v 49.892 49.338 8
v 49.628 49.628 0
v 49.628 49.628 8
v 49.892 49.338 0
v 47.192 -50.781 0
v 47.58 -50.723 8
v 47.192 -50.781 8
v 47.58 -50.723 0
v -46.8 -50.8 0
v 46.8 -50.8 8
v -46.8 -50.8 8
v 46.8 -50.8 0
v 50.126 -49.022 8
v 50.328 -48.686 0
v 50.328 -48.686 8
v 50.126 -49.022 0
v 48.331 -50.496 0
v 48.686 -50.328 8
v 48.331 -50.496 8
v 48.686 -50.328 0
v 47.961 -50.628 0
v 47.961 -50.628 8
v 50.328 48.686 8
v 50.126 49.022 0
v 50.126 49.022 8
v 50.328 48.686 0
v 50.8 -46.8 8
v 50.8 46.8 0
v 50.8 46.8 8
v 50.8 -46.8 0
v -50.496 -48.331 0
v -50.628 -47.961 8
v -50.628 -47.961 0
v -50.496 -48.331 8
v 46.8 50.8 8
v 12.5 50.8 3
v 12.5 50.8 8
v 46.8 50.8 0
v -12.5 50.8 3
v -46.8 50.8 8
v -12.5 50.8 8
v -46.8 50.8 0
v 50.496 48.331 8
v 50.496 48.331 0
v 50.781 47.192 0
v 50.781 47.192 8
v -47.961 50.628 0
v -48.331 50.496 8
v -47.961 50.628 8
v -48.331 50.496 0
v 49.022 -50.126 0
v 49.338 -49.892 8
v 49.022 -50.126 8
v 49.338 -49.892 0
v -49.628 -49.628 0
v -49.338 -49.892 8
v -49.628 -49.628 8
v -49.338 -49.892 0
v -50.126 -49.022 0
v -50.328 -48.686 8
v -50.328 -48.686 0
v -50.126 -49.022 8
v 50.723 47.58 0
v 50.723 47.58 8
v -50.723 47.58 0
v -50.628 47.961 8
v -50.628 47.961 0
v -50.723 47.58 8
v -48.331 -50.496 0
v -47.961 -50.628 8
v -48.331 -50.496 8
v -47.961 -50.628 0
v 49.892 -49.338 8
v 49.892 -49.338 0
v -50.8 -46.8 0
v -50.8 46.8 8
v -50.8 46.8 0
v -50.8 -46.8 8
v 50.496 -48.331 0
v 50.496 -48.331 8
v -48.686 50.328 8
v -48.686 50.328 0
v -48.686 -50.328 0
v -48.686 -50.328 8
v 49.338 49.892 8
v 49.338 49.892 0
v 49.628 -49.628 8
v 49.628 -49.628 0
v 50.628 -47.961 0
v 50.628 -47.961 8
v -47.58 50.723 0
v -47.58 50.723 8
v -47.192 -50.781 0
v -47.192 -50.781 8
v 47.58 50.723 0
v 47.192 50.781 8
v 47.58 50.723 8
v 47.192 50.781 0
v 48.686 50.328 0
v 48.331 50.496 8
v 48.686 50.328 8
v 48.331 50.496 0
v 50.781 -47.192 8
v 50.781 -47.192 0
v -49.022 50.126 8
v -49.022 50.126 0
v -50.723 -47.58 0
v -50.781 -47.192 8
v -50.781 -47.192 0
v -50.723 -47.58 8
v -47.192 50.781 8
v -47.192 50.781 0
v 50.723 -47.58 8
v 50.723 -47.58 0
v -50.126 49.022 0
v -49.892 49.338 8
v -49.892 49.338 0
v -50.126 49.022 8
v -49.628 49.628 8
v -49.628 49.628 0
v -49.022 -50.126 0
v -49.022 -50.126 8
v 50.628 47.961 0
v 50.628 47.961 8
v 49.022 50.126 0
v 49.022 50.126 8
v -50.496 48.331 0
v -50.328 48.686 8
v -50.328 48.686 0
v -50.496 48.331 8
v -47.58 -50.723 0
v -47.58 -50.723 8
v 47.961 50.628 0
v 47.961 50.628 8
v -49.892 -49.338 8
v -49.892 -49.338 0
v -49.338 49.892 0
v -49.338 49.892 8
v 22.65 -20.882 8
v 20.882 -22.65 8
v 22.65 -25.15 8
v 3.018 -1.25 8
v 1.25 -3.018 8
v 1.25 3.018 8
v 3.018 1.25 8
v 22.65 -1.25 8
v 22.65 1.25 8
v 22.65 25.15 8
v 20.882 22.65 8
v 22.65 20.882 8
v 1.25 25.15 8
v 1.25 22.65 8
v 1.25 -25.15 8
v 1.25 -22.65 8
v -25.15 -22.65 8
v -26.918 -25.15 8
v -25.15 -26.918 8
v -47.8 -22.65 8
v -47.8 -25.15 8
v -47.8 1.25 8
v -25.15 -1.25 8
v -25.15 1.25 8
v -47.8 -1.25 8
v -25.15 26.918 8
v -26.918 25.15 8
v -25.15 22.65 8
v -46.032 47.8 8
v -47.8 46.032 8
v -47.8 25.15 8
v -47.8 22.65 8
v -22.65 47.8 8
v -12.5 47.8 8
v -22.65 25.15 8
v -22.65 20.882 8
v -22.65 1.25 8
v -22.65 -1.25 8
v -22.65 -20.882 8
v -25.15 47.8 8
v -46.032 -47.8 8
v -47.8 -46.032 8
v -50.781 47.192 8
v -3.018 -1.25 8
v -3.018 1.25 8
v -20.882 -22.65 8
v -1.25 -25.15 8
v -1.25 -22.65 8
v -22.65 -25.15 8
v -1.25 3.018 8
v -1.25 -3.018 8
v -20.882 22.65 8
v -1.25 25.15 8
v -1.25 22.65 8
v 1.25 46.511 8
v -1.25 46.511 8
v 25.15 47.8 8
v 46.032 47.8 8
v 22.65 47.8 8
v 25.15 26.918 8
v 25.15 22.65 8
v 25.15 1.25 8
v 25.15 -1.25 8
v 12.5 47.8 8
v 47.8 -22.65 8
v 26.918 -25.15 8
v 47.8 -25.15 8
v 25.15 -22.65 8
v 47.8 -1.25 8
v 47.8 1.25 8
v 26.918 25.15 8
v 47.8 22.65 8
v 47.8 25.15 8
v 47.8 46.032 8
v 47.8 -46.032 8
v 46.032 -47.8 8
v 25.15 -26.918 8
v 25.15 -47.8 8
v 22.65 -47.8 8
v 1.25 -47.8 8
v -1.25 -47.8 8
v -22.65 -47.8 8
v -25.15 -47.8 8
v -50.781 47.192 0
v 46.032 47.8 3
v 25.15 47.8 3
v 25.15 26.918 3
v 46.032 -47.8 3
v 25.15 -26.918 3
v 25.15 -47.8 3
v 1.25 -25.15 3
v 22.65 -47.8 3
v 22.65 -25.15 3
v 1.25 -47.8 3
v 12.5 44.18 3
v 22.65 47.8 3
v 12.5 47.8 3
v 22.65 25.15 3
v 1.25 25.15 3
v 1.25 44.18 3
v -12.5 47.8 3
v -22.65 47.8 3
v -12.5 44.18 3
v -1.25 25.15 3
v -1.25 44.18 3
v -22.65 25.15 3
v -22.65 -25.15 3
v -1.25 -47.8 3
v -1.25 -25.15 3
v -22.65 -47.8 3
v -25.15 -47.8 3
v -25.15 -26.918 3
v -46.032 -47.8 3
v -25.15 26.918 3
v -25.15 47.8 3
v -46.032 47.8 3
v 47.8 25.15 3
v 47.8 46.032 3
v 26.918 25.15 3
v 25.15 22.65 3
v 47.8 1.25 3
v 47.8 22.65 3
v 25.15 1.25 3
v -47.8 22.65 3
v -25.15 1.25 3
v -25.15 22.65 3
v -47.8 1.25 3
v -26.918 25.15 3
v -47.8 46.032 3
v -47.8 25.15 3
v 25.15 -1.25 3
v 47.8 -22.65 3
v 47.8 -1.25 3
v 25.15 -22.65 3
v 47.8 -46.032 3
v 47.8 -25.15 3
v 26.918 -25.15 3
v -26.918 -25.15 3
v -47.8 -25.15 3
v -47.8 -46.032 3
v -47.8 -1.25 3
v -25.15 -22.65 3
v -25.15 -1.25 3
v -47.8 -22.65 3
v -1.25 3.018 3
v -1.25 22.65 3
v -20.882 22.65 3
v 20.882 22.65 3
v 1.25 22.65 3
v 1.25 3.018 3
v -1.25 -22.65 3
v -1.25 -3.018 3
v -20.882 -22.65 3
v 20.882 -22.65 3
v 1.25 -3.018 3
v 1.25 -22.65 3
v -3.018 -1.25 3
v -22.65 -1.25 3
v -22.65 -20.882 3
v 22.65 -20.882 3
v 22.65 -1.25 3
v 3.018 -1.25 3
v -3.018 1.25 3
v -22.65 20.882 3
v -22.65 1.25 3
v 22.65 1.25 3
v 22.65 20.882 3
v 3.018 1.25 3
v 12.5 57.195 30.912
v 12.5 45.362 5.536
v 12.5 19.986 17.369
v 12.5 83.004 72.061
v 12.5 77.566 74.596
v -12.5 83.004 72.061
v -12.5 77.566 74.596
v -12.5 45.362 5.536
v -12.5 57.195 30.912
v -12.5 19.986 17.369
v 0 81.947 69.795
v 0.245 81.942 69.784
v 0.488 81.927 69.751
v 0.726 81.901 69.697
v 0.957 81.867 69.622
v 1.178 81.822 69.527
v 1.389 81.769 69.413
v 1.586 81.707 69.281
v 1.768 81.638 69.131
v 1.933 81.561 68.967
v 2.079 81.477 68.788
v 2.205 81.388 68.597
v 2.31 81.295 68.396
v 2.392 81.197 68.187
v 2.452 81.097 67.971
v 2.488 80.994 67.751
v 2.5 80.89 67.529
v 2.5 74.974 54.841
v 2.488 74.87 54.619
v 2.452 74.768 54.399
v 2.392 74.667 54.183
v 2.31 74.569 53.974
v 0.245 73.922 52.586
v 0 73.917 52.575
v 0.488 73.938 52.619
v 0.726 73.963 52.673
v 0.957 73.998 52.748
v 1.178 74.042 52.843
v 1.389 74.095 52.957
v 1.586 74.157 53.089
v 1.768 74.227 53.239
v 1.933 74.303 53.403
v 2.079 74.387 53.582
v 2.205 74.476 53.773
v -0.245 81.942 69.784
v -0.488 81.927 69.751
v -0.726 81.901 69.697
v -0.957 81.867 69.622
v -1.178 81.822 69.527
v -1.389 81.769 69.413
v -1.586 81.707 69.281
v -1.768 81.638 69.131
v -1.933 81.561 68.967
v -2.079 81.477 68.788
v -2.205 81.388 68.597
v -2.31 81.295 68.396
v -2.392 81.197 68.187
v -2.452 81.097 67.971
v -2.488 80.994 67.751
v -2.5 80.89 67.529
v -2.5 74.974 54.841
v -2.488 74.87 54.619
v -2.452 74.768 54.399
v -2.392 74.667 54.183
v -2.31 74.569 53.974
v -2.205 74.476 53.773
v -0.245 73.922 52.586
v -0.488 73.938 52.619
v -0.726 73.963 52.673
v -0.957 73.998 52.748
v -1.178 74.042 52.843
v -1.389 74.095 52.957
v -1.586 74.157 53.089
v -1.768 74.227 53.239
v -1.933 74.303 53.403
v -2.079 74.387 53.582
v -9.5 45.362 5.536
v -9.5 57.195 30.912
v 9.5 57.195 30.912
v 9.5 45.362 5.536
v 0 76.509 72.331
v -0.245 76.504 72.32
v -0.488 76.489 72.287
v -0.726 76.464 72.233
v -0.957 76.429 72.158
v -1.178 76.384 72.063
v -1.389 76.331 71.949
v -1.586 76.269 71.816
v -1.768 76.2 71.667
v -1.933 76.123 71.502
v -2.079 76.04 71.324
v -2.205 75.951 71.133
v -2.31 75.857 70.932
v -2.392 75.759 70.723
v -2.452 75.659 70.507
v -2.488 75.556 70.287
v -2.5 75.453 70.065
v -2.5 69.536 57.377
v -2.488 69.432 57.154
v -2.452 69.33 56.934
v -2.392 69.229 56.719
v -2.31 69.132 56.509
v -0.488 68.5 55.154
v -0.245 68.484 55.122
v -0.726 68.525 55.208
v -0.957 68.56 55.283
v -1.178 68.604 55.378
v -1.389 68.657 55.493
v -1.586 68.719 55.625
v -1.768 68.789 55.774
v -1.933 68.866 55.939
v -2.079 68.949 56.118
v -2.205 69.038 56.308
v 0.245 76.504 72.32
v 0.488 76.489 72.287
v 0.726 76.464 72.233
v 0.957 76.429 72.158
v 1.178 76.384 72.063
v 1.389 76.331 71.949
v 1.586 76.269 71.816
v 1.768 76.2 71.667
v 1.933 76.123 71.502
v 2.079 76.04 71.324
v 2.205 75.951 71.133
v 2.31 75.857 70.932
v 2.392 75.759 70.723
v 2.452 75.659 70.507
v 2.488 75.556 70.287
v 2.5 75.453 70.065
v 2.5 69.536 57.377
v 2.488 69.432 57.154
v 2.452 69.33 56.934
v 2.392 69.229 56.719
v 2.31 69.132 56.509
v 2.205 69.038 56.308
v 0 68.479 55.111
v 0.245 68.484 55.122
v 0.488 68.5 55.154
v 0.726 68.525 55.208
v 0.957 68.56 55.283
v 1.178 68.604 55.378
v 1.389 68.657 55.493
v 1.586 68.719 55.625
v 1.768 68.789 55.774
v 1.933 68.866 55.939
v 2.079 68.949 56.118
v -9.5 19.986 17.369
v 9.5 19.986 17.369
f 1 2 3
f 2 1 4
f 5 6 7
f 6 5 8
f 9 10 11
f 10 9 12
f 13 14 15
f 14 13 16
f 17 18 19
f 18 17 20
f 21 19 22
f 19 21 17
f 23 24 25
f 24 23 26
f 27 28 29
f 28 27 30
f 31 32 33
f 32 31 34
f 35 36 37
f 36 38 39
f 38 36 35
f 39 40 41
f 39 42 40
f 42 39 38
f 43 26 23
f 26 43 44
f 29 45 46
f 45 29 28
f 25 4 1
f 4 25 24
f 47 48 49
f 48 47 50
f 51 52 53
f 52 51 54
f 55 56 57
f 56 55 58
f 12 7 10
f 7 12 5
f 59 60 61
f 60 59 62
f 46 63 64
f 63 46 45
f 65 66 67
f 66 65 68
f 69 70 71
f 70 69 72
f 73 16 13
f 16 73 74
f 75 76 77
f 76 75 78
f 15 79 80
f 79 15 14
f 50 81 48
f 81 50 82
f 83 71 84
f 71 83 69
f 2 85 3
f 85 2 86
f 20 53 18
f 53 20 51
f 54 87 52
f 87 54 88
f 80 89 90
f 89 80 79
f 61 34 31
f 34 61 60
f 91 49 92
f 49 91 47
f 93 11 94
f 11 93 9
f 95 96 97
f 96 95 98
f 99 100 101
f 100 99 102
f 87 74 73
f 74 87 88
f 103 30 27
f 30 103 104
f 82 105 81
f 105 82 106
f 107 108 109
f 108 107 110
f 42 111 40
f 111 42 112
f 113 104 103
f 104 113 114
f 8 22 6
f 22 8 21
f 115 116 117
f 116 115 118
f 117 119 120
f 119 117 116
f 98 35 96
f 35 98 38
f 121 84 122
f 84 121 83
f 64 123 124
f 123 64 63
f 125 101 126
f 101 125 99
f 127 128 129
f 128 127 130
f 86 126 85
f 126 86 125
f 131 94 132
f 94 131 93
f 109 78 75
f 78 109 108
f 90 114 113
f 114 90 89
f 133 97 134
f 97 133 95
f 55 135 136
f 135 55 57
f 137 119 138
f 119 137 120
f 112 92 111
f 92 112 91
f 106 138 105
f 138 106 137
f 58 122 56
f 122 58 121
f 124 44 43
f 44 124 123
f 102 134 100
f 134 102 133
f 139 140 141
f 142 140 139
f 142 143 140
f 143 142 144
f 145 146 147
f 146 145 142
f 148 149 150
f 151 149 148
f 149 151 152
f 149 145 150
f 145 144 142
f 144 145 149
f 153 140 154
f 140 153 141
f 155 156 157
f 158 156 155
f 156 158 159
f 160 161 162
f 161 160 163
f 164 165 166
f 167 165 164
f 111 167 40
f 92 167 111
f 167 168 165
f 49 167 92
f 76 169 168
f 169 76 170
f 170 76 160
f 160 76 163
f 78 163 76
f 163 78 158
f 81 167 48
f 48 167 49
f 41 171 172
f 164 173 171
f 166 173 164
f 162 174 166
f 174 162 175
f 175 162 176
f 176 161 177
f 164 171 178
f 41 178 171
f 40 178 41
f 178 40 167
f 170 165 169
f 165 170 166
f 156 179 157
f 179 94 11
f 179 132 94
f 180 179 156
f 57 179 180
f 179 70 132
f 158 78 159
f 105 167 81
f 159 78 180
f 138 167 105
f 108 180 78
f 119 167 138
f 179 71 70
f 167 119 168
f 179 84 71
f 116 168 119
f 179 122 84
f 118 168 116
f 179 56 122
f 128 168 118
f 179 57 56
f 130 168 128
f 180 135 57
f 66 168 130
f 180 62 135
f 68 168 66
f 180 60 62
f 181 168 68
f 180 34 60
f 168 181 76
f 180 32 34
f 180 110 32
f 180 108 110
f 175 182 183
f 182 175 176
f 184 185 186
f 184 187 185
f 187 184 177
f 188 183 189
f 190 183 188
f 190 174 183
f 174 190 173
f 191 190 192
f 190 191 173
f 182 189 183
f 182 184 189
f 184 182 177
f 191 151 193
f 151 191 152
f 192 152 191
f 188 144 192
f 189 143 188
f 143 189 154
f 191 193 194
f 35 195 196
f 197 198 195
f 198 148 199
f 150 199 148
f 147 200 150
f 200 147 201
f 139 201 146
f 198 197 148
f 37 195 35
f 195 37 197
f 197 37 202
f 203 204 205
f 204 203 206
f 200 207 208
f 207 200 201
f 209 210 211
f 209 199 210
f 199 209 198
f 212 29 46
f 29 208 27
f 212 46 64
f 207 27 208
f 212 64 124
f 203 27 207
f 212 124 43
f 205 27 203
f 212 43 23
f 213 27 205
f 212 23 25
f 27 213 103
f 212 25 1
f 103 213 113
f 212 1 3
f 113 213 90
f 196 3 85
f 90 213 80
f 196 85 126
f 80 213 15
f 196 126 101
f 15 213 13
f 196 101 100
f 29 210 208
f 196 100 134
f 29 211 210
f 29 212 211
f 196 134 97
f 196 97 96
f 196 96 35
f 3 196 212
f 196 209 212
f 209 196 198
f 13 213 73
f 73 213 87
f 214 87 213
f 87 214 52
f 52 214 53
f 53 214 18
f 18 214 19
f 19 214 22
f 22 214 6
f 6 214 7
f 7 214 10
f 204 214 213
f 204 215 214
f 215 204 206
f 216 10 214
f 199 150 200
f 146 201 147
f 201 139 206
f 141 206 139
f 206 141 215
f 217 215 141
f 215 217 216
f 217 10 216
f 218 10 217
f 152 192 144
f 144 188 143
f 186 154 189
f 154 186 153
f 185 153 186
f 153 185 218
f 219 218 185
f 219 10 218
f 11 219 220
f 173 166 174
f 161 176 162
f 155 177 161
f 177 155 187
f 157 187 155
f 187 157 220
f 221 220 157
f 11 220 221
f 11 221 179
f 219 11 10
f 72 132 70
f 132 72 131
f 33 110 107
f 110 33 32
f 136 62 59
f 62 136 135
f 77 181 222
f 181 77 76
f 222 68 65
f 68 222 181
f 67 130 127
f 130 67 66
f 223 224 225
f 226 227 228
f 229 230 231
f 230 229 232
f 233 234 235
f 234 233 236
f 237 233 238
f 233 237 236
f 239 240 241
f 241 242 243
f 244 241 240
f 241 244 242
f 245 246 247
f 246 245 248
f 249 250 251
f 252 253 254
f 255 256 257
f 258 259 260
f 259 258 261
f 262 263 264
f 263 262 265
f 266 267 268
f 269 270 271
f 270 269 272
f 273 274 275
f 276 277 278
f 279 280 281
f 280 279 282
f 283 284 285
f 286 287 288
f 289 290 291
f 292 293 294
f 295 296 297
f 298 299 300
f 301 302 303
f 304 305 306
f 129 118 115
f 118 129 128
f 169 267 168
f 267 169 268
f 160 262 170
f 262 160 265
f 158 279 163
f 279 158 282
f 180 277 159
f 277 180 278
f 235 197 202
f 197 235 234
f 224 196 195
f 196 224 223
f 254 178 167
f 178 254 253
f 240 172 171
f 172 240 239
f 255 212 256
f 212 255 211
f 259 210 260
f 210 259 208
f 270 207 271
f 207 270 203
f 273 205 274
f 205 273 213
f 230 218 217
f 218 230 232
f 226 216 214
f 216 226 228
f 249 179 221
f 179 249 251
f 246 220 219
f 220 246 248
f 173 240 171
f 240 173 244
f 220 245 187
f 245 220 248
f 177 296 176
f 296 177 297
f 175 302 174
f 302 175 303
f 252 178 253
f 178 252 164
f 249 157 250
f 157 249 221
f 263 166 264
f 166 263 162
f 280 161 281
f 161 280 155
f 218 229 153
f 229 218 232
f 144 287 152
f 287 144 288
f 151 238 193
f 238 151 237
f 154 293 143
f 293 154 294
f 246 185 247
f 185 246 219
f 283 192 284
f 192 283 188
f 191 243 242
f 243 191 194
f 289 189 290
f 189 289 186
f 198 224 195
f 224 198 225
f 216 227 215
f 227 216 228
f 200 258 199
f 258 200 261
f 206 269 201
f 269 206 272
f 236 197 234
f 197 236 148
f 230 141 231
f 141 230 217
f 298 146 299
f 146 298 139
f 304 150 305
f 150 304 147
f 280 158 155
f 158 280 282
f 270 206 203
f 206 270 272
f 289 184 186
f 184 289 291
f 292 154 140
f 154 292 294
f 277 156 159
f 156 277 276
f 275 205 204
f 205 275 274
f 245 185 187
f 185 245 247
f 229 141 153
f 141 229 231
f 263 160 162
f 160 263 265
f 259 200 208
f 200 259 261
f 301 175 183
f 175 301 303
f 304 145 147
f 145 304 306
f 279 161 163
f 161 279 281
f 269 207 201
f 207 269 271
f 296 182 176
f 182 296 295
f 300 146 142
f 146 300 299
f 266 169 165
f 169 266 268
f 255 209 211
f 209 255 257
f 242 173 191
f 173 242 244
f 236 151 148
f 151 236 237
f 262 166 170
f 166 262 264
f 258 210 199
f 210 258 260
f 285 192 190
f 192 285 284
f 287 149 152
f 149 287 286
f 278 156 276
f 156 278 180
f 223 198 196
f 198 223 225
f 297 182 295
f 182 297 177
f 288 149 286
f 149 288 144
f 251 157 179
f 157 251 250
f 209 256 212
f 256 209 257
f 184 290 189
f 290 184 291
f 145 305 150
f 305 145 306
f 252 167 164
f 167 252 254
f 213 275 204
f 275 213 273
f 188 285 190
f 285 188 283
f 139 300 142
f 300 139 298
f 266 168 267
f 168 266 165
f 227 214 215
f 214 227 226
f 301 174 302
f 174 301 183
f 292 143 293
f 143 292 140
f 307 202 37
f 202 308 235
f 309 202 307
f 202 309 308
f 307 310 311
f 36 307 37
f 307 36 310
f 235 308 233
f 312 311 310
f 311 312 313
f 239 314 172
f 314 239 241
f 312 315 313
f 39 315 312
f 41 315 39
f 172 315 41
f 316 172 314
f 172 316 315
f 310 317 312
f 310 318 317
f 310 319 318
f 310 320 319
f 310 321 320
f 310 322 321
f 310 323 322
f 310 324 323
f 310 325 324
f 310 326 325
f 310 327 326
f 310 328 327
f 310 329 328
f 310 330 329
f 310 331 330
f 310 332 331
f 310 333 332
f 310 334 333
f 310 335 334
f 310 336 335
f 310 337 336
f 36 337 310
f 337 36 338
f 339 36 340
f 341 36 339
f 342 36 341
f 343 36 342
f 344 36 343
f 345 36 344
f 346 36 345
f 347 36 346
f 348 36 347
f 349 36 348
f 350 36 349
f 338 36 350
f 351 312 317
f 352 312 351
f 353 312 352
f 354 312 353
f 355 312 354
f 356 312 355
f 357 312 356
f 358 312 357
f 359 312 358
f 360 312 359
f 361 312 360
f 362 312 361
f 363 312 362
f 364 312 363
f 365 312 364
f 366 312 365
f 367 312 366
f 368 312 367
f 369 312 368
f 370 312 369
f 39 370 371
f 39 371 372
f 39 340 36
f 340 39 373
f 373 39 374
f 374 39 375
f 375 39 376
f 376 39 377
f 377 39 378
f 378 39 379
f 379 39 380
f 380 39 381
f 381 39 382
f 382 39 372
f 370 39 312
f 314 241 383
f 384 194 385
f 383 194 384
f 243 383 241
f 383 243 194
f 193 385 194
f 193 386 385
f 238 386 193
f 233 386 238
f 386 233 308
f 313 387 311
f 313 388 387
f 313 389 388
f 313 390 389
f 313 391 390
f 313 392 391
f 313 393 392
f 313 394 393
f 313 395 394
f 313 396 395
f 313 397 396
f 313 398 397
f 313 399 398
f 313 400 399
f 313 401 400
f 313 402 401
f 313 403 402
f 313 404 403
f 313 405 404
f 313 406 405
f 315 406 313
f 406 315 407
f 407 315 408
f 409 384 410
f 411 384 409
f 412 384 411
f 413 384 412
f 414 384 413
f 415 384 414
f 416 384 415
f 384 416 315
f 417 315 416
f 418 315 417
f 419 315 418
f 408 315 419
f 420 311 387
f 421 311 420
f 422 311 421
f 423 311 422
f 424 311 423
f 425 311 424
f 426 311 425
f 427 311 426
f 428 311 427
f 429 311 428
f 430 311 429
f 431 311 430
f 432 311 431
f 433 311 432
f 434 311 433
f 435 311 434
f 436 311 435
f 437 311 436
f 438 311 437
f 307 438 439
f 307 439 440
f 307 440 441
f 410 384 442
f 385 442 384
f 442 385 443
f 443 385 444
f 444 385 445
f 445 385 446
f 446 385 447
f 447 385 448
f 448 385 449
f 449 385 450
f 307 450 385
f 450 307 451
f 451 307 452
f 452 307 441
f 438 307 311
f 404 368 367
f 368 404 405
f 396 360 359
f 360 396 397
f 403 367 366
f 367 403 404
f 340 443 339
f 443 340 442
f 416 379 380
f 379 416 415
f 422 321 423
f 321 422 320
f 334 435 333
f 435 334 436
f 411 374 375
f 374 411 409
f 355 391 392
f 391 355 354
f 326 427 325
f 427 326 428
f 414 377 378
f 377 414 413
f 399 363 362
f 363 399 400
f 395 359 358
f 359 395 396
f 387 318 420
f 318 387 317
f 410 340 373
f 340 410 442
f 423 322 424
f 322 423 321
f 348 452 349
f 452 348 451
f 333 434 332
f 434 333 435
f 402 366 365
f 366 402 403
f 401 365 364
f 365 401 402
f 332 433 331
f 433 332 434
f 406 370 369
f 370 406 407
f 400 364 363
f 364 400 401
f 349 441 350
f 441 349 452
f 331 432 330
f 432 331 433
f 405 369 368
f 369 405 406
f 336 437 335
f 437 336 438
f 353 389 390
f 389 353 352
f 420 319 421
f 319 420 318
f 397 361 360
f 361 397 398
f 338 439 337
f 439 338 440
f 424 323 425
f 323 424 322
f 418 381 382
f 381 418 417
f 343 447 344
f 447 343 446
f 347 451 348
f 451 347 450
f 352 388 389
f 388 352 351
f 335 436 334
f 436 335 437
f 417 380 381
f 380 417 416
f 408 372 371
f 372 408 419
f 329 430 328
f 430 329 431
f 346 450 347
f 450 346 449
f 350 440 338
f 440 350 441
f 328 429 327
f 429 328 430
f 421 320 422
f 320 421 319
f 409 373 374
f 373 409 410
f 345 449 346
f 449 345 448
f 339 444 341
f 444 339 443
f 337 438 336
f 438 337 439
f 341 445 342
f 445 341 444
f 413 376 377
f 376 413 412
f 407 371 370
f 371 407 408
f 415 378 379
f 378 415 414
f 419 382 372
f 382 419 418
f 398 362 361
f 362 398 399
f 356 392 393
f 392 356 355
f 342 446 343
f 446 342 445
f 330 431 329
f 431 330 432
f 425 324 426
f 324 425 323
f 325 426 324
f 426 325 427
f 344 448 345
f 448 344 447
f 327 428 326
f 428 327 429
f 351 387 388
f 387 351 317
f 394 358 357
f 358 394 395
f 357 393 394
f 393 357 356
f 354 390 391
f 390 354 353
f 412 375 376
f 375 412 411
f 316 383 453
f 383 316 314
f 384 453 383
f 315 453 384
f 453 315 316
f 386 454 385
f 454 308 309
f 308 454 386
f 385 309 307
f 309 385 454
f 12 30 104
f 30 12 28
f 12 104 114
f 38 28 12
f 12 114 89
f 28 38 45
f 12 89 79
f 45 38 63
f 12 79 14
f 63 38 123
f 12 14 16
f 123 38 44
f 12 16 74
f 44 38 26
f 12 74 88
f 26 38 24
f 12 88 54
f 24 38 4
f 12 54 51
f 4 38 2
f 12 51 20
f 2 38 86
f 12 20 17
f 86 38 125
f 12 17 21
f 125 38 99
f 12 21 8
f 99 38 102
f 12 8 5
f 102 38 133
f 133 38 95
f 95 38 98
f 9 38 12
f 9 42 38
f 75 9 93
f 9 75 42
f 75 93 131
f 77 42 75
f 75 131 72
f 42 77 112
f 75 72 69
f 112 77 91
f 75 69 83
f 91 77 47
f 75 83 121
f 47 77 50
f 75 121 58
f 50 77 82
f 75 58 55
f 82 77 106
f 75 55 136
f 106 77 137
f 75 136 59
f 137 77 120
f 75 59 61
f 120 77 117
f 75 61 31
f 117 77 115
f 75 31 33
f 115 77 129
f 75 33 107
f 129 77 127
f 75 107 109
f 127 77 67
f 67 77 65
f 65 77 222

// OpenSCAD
// marker_plate.scad
//
// Rigid backing plate for the ArUco/AprilTag scope marker, with an arm that
// carries a single mounting screw.
//
// Why this exists: a paper tag taped to the curved shroud read cleanly for
// about 19 hours and then stopped decoding. The detector still FOUND the
// marker's quadrilateral but could not read its bits, because sampling the
// cell grid uses a planar homography and the buckled paper was no longer
// planar. Size and viewing angle were both ruled out — the failing read was
// larger and closer to face-on than the working one. Flatness was the whole
// problem, so the plate's only real job is to stay flat and stand proud of the
// shroud's curve rather than conforming to it.
//
// Print face down. The tag goes on the underside (z=0), which comes off the
// build plate smoothest — a textured or ribbed tag face would scatter the IR
// illuminator at night and defeat the point.
//
//   openscad -o marker_plate.stl marker_plate.scad
//   openscad -D plate_size=127 -o marker_plate_5in.stl marker_plate.scad

/* [Plate] */
inch            = 25.4;
plate_size      = 4 * inch;   // 4" square, matching the printed tag
plate_thick     = 3;          // solid thickness under the tag
corner_radius   = 4;          // rounds the corners; 0 for square

/* [Tag recess] */
// Optional shallow pocket on the tag face so the print locates the tag and
// protects its edges. Leave at 0 for a flat face and glue the tag on.
// Only useful if plate_size is LARGER than tag_size — with both at 4" the
// pocket spans the whole face and locates nothing.
tag_recess      = 0;          // depth, mm
tag_size        = 4 * inch;   // tag outer size including its white quiet zone

/* [Stiffening] */
rim_height      = 5;          // perimeter lip on the back — most of the stiffness
rim_width       = 3;
rib_height      = 5;          // internal ribs
rib_width       = 2.5;
ribs_x          = 3;          // ribs running along X
ribs_y          = 3;          // ribs running along Y
diagonal_ribs   = true;       // adds torsional stiffness the grid alone lacks

/* [Arm] */
arm_height      = 3 * inch;   // measured along the arm, from the plate edge
arm_width       = 25;
arm_thick       = 6;
arm_edge        = "y";        // which edge the arm sits on: "y" or "x"

// Angle between the arm and the plate's normal. 0 keeps the original
// perpendicular L-bracket; positive leans the arm back OVER the plate, which
// swings the tag face toward whatever the arm is bolted away from.
//
// This exists because the marker only has to be readable when the scope is
// PARKED. Detection failing in any other pose is free -- the gate returns
// "unknown" and refuses, which is the same action as "unsafe". Detection
// failing at park is the expensive one: it is a false negative on the only
// verdict that lets hardware move, and it costs the night. So aim the tag at
// the camera at park and let every other pose fall off the cliff.
//
// Measured 2026-08-17 with the arm perpendicular: the tag presented 74x42 px,
// an aspect of 1.76, i.e. about 55 degrees oblique, leaving only 1.5x over the
// degraded detection floor. Square-on it would present 74 px and 2.6x.
arm_tilt        = 25;         // degrees

/* [Screw] */
// M4 with deliberate slop. Nominal M4 is 4.0 and a standard clearance hole is
// 4.5, but printed holes come out undersize -- typically 0.1-0.4 mm depending
// on the machine -- so 4.5 nominal can arrive as a 4.2 that fights the screw.
// 5.0 leaves genuine play, which is wanted here: the plate is aimed by hand
// once it is on the telescope, and a tight hole would resist that.
// Use 4.5 for a close fit, 5.4 for M5, 6.8 for 1/4-20.
hole_dia        = 5.0;
hole_from_top   = 12;         // centre of the hole below the arm's tip
counterbore_dia = 0;          // 0 = plain through hole
counterbore_dep = 0;

// A slot rather than a round hole, running along the arm. Two reasons: the
// standoff distance becomes adjustable without reprinting, and a single screw
// already lets the plate pivot, so between them the tag can be aimed at the
// camera by hand once it is on the telescope. 0 gives a plain round hole.
slot_length     = 14;

/* [Gussets] */
// The arm root is the only place this part can plausibly break: a long lever
// meeting a thin plate. Two triangular webs carry that moment into the plate.
gusset_run      = 28;         // how far the web reaches across the plate
gusset_rise     = 34;         // how far it climbs the arm
gusset_thick    = 3;

/* [Quality] */
$fn             = 64;

// ---------------------------------------------------------------- geometry

module rounded_square(size, r, h) {
    if (r <= 0) {
        translate([-size/2, -size/2, 0]) cube([size, size, h]);
    } else {
        hull() for (sx = [-1, 1], sy = [-1, 1])
            translate([sx * (size/2 - r), sy * (size/2 - r), 0])
                cylinder(r = r, h = h);
    }
}

module plate() {
    difference() {
        rounded_square(plate_size, corner_radius, plate_thick);
        if (tag_recess > 0)
            translate([0, 0, -0.01])
                rounded_square(tag_size, max(0, corner_radius - 1), tag_recess + 0.01);
    }
}

module rim() {
    difference() {
        translate([0, 0, plate_thick])
            rounded_square(plate_size, corner_radius, rim_height);
        translate([0, 0, plate_thick - 0.01])
            rounded_square(plate_size - 2 * rim_width,
                           max(0, corner_radius - rim_width), rim_height + 0.02);
    }
}

module ribs() {
    span = plate_size - 2 * rim_width;
    // Ribs run between the rims rather than to the plate edge, so they tie the
    // rim together instead of just adding material near a free edge.
    for (i = [1 : ribs_x])
        translate([-span/2 + i * span / (ribs_x + 1) - rib_width/2,
                   -span/2, plate_thick])
            cube([rib_width, span, rib_height]);
    for (i = [1 : ribs_y])
        translate([-span/2, -span/2 + i * span / (ribs_y + 1) - rib_width/2,
                   plate_thick])
            cube([span, rib_width, rib_height]);
    if (diagonal_ribs)
        // A rectangular grid resists bending but racks in torsion; the
        // diagonals are what stop the plate twisting about the arm.
        intersection() {
            translate([0, 0, plate_thick])
                rounded_square(plate_size - 2 * rim_width,
                               max(0, corner_radius - rim_width), rib_height);
            // The union() is load-bearing: intersection() intersects ALL its
            // children, so a bare for-loop here would give the two diagonals
            // intersected with each other — a small lozenge at the centre
            // instead of a cross.
            union()
                for (a = [45, -45])
                    rotate([0, 0, a])
                        translate([-plate_size, -rib_width/2, 0])
                            cube([2 * plate_size, rib_width,
                                  plate_thick + rib_height]);
        }
}

// How far the arm is grown BELOW the plate before tilting. After rotation about
// the plate's edge the root would otherwise swing clear of the plate and leave
// the arm floating; this guarantees it always penetrates, and the surplus is
// trimmed off the tag face at the end.
root_extra = 25;

module arm_body() {
    base = plate_thick;
    difference() {
        translate([-arm_width/2, plate_size/2 - arm_thick, -root_extra])
            cube([arm_width, arm_thick, root_extra + base + arm_height]);
        // Screw opening through the arm's thickness. A hull of two circles
        // makes the slot; with slot_length 0 they coincide and it is a hole.
        translate([0, plate_size/2 + 0.01, base + arm_height - hole_from_top])
            rotate([90, 0, 0])
                hull() {
                    translate([0, -slot_length/2, 0]) cylinder(d = hole_dia, h = arm_thick + 0.02);
                    translate([0,  slot_length/2, 0]) cylinder(d = hole_dia, h = arm_thick + 0.02);
                }
        if (counterbore_dia > 0)
            translate([0, plate_size/2 + 0.01, base + arm_height - hole_from_top])
                rotate([90, 0, 0])
                    hull() {
                        translate([0, -slot_length/2, 0]) cylinder(d = counterbore_dia, h = counterbore_dep + 0.01);
                        translate([0,  slot_length/2, 0]) cylinder(d = counterbore_dia, h = counterbore_dep + 0.01);
                    }
    }
}

// Arm and gussets rotate together about the plate's outer edge: the gussets
// brace the arm, so they have to follow it or they would brace thin air.
module tilted_arm() {
    translate([0, plate_size/2, plate_thick])
        rotate([-arm_tilt, 0, 0])
            translate([0, -plate_size/2, -plate_thick]) {
                arm_body();
                gussets();
            }
}

module gussets() {
    base = plate_thick;
    for (sx = [-1, 1])
        translate([sx * (arm_width/2 - gusset_thick/2) - gusset_thick/2, 0, 0])
            rotate([90, 0, 90])
                // The vertical edge runs to plate_size/2, the arm's OUTER
                // face, so the gusset passes right through the arm. Ending it
                // at the arm's inner face (plate_size/2 - arm_thick) looks
                // correct and is not: the two solids then meet on a
                // zero-thickness plane, CGAL reports them as disjoint, and the
                // part slices as a floating arm plus two loose triangles.
                // Caught by rendering, invisible to reading.
                linear_extrude(height = gusset_thick)
                    polygon([[plate_size/2,                  base],
                             [plate_size/2,                  base + gusset_rise],
                             [plate_size/2 - arm_thick - gusset_run, base]]);
}

module marker_plate() {
    difference() {
        union() {
            plate();
            rim();
            ribs();
            tilted_arm();
        }
        // Keep the tag face perfectly flat. The tilted arm's root is grown
        // below the plate so it cannot float, and this removes the surplus --
        // any bump on this face would sit under the tag and reintroduce
        // exactly the non-planarity that killed the paper marker.
        translate([-plate_size, -plate_size, -4 * root_extra])
            cube([3 * plate_size, 3 * plate_size, 4 * root_extra]);
    }
}

// The arm is described as sitting on the +Y edge; rotating the whole part is
// simpler and less error-prone than parameterising every reference to it.
if (arm_edge == "x") rotate([0, 0, 90]) marker_plate();
else                 marker_plate();

echo(str("plate ", plate_size, " mm (", plate_size/inch, " in) square, ",
         plate_thick, " mm thick"));
echo(str("arm ", arm_height, " mm (", arm_height/inch, " in) long, tilted ",
         arm_tilt, " deg from the plate normal"));
echo(str("opening ", hole_dia, " mm", slot_length > 0 ?
         str(" x ", slot_length, " mm slot") : " round hole",
         ", ", hole_from_top, " mm below the tip"));
echo(str("arm tip reaches ", plate_thick + arm_height*cos(arm_tilt),
         " mm above the tag face and ", arm_height*sin(arm_tilt),
         " mm back over the plate"));
